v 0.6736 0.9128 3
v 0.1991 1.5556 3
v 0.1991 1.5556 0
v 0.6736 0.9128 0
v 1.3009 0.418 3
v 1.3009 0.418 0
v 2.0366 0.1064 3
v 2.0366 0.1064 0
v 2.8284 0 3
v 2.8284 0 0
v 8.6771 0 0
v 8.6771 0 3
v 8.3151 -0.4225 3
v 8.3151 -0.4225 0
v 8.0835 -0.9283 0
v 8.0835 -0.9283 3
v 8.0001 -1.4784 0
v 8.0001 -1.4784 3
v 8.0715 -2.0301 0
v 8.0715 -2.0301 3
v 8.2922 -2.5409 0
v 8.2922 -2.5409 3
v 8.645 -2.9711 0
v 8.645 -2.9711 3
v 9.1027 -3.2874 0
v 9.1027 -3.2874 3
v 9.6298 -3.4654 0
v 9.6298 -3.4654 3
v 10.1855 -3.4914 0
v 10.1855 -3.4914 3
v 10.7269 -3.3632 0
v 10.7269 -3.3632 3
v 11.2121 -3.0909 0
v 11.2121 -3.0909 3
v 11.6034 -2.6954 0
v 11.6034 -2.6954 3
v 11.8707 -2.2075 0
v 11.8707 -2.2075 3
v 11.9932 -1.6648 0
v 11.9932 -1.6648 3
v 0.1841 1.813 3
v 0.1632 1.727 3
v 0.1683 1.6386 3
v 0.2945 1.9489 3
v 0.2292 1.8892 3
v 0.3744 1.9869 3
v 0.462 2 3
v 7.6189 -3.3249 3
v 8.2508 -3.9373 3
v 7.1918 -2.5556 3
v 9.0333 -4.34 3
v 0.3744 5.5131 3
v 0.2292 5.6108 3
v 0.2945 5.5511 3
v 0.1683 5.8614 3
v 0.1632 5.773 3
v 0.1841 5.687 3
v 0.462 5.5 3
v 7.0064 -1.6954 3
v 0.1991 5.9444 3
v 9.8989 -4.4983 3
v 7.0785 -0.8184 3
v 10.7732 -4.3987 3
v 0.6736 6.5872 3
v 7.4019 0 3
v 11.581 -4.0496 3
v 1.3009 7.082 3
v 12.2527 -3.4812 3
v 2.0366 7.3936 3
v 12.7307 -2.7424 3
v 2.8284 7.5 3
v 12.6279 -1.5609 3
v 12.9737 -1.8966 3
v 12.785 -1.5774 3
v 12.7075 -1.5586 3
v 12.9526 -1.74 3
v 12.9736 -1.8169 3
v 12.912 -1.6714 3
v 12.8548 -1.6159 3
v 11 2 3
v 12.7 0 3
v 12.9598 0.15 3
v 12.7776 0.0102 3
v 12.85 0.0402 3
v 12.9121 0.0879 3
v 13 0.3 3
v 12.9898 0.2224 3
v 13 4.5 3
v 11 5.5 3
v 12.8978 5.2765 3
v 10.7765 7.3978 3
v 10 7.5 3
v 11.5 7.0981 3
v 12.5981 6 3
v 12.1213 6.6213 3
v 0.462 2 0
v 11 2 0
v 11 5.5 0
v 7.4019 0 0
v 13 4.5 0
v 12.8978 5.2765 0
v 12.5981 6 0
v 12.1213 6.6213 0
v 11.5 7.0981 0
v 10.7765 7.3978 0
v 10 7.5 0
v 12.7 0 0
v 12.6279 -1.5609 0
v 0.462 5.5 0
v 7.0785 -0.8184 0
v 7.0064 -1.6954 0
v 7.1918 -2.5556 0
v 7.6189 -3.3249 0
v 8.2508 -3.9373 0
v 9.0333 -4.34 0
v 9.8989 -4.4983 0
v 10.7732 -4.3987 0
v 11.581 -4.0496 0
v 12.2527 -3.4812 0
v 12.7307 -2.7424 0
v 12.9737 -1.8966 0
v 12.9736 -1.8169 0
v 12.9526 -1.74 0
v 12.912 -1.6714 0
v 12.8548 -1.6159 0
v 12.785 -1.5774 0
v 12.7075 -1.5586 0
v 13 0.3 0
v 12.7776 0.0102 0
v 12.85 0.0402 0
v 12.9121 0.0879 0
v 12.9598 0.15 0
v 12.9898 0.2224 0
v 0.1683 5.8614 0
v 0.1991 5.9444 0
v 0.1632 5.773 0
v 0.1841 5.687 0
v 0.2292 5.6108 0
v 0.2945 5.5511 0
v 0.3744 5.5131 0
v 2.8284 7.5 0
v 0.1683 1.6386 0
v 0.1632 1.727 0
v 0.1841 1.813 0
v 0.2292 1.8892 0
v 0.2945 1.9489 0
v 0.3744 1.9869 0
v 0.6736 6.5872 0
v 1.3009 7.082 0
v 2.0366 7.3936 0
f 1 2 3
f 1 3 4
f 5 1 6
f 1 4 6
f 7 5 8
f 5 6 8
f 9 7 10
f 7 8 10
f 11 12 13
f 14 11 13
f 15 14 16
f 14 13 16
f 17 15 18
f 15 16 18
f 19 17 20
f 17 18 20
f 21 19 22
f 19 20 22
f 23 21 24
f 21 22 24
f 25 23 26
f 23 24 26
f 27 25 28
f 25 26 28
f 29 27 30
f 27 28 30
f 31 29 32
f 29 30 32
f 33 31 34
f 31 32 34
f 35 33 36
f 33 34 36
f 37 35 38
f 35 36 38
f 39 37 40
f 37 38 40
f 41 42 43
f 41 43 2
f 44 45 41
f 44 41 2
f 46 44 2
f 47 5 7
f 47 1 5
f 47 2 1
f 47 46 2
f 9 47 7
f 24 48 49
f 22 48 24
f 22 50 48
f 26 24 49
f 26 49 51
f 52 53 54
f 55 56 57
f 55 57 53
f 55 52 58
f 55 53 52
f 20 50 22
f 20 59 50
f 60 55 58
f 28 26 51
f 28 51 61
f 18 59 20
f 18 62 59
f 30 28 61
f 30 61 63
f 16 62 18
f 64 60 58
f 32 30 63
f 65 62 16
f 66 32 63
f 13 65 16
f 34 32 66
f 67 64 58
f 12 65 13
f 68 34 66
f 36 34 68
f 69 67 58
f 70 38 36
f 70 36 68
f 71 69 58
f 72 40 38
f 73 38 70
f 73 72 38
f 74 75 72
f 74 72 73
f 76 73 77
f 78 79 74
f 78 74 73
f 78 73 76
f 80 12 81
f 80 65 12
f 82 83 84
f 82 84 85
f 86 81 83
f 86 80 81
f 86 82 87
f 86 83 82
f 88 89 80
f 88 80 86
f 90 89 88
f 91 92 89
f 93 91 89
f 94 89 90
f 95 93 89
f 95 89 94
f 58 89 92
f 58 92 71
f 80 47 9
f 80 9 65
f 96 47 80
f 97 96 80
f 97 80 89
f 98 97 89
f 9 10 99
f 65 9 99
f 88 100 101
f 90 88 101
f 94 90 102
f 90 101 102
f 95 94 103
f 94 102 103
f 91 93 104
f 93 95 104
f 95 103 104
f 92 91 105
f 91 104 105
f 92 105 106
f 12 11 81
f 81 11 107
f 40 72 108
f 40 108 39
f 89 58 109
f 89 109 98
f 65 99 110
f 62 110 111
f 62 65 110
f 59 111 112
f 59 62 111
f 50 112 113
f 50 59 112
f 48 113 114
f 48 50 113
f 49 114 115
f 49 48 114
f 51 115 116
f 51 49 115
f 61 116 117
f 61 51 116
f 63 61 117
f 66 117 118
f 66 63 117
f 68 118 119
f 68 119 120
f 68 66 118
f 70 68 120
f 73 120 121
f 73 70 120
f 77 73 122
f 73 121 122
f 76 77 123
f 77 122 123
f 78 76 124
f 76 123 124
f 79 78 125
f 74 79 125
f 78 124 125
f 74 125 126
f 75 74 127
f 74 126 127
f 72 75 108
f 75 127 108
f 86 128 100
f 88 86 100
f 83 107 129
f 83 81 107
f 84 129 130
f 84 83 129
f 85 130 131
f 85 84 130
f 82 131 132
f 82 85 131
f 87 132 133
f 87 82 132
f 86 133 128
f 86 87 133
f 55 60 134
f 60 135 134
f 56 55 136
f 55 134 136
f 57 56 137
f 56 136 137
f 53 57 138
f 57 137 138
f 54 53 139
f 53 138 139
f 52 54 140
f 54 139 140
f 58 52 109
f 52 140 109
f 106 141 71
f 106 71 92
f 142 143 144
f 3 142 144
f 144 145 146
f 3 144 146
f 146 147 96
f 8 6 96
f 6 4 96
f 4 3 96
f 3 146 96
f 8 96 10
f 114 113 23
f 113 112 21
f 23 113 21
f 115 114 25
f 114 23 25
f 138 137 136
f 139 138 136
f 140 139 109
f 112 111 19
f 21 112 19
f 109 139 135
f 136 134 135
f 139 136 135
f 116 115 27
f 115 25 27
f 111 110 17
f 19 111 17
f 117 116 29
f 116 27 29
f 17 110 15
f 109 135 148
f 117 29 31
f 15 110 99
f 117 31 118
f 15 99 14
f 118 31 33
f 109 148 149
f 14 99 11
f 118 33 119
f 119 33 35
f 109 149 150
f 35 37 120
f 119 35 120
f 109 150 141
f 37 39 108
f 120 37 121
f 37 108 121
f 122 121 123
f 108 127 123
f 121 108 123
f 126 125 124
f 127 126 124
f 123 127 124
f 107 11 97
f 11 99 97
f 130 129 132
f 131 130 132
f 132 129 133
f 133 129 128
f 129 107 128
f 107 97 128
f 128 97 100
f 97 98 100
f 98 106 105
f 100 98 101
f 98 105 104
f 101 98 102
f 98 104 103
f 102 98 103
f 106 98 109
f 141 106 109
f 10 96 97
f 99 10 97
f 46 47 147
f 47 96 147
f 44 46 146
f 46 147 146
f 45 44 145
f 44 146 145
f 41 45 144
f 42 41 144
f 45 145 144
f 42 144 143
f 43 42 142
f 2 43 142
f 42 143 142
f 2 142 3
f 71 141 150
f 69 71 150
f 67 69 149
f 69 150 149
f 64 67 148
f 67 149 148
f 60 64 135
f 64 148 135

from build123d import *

# Parameters (mm, degrees)
SZKIC1_W                    = 13
SZKIC1_H                    = 7.5
DODANIE_WYCI_GNI_CIE1_DEPTH = 3
SZKIC2_W                    = 11
SZKIC2_H                    = 3.5
WYTNIJ_WYCI_GNI_CIE1_DEPTH  = 3
ZAOKR_GLENIE1_R             = 3
SZKIC3_R                    = 3
SZKIC3_R_2                  = 2
DODANIE_WYCI_GNI_CIE2_DEPTH = 3
WYTNIJ_WYCI_GNI_CIE2_DEPTH  = 3
ZAOKR_GLENIE2_R             = 0.3


with BuildPart() as part:
    # Szkic1 → Dodanie-wyciągnięcie1 (new body)
    with BuildSketch(Plane.XY):
        with Locations((6.5, 3.75)):
            Rectangle(SZKIC1_W, SZKIC1_H)
    extrude(amount=DODANIE_WYCI_GNI_CIE1_DEPTH)

    # Szkic2 → Wytnij-wyciągnięcie1 (cut)
    with BuildSketch(Plane.XY.offset(3)):
        with Locations((5.5, 3.75)):
            Rectangle(SZKIC2_W, SZKIC2_H)
    extrude(amount=-WYTNIJ_WYCI_GNI_CIE1_DEPTH, mode=Mode.SUBTRACT)

    # Zaokrąglenie1
    # the kernel refuses this fillet: 3 mm, written as the material it takes off along each edge
    with BuildSketch(Plane(origin=(13, 7.5, -7.5), x_dir=(0, -1, 0), z_dir=(0, 0, 1))) as zaokr_glenie1_piece_1:
        with BuildLine():
            CenterArc((ZAOKR_GLENIE1_R, -ZAOKR_GLENIE1_R), ZAOKR_GLENIE1_R, 90, 90)
            Line((0, -ZAOKR_GLENIE1_R), (-ZAOKR_GLENIE1_R * 0.02, -ZAOKR_GLENIE1_R))
            Line((-ZAOKR_GLENIE1_R * 0.02, -ZAOKR_GLENIE1_R), (-ZAOKR_GLENIE1_R * 0.02, ZAOKR_GLENIE1_R * 0.02))
            Line((-ZAOKR_GLENIE1_R * 0.02, ZAOKR_GLENIE1_R * 0.02), (ZAOKR_GLENIE1_R, ZAOKR_GLENIE1_R * 0.02))
            Line((ZAOKR_GLENIE1_R, ZAOKR_GLENIE1_R * 0.02), (ZAOKR_GLENIE1_R, 0))
        make_face()
    extrude(amount=18, mode=Mode.SUBTRACT)
    with BuildSketch(Plane(origin=(0, 0, -7.071067812), x_dir=(1, 0, 0), z_dir=(0, 0, 1))) as zaokr_glenie1_piece_2:
        with BuildLine():
            CenterArc((2.828427125, 3), ZAOKR_GLENIE1_R, 199.471220634, 70.528779366)
            Line((0, 2), (-0.056568542, 1.98))
            ThreePointArc((-0.056568542, 1.98), (-0.06, 1), (-0.06, 0))
            Line((-0.06, 0), (0, -0.06))
            Line((0, -0.06), (2.828427125, -0.06))
            Line((2.828427125, -0.06), (2.828427125, 0))
        make_face()
    extrude(amount=17.142135624, mode=Mode.SUBTRACT)
    with BuildSketch(Plane(origin=(0, 7.5, -7.071067812), x_dir=(1, 0, 0), z_dir=(0, 0, 1))) as zaokr_glenie1_piece_3:
        with BuildLine():
            CenterArc((2.828427125, -3), ZAOKR_GLENIE1_R, 90, 70.528779366)
            Line((0, -2), (-0.056568542, -1.98))
            ThreePointArc((-0.056568542, -1.98), (-0.06, -1), (-0.06, 0))
            Line((-0.06, 0), (0, 0.06))
            Line((0, 0.06), (2.828427125, 0.06))
            Line((2.828427125, 0.06), (2.828427125, 0))
        make_face()
    extrude(amount=17.142135624, mode=Mode.SUBTRACT)

    # Szkic3 → Dodanie-wyciągnięcie2 (add)
    with BuildSketch(Plane.XY.offset(3)):
        with Locations((10, -1.5)):
            Circle(SZKIC3_R)
        with Locations((10, -1.5)):
            Circle(SZKIC3_R_2, mode=Mode.SUBTRACT)
    extrude(amount=-DODANIE_WYCI_GNI_CIE2_DEPTH)

    # Szkic4 → Wytnij-wyciągnięcie2 (cut)
    with BuildSketch(Plane.XY.offset(3)):
        Polygon((10, 0), (13, 0), (13, -1.5), (10, -1.990922123), align=None)
    extrude(amount=-WYTNIJ_WYCI_GNI_CIE2_DEPTH, mode=Mode.SUBTRACT)

    # Zaokrąglenie2
    zaokr_glenie2_edges = [part.edges().sort_by_distance(p)[0] for p in [
        (0, 2, 1.5),
        (0, 5.5, 1.5),
        (13, -1.5, 1.5),
        (13, 0, 1.5),
    ]]
    fillet(zaokr_glenie2_edges, radius=ZAOKR_GLENIE2_R)


solid = part.part
